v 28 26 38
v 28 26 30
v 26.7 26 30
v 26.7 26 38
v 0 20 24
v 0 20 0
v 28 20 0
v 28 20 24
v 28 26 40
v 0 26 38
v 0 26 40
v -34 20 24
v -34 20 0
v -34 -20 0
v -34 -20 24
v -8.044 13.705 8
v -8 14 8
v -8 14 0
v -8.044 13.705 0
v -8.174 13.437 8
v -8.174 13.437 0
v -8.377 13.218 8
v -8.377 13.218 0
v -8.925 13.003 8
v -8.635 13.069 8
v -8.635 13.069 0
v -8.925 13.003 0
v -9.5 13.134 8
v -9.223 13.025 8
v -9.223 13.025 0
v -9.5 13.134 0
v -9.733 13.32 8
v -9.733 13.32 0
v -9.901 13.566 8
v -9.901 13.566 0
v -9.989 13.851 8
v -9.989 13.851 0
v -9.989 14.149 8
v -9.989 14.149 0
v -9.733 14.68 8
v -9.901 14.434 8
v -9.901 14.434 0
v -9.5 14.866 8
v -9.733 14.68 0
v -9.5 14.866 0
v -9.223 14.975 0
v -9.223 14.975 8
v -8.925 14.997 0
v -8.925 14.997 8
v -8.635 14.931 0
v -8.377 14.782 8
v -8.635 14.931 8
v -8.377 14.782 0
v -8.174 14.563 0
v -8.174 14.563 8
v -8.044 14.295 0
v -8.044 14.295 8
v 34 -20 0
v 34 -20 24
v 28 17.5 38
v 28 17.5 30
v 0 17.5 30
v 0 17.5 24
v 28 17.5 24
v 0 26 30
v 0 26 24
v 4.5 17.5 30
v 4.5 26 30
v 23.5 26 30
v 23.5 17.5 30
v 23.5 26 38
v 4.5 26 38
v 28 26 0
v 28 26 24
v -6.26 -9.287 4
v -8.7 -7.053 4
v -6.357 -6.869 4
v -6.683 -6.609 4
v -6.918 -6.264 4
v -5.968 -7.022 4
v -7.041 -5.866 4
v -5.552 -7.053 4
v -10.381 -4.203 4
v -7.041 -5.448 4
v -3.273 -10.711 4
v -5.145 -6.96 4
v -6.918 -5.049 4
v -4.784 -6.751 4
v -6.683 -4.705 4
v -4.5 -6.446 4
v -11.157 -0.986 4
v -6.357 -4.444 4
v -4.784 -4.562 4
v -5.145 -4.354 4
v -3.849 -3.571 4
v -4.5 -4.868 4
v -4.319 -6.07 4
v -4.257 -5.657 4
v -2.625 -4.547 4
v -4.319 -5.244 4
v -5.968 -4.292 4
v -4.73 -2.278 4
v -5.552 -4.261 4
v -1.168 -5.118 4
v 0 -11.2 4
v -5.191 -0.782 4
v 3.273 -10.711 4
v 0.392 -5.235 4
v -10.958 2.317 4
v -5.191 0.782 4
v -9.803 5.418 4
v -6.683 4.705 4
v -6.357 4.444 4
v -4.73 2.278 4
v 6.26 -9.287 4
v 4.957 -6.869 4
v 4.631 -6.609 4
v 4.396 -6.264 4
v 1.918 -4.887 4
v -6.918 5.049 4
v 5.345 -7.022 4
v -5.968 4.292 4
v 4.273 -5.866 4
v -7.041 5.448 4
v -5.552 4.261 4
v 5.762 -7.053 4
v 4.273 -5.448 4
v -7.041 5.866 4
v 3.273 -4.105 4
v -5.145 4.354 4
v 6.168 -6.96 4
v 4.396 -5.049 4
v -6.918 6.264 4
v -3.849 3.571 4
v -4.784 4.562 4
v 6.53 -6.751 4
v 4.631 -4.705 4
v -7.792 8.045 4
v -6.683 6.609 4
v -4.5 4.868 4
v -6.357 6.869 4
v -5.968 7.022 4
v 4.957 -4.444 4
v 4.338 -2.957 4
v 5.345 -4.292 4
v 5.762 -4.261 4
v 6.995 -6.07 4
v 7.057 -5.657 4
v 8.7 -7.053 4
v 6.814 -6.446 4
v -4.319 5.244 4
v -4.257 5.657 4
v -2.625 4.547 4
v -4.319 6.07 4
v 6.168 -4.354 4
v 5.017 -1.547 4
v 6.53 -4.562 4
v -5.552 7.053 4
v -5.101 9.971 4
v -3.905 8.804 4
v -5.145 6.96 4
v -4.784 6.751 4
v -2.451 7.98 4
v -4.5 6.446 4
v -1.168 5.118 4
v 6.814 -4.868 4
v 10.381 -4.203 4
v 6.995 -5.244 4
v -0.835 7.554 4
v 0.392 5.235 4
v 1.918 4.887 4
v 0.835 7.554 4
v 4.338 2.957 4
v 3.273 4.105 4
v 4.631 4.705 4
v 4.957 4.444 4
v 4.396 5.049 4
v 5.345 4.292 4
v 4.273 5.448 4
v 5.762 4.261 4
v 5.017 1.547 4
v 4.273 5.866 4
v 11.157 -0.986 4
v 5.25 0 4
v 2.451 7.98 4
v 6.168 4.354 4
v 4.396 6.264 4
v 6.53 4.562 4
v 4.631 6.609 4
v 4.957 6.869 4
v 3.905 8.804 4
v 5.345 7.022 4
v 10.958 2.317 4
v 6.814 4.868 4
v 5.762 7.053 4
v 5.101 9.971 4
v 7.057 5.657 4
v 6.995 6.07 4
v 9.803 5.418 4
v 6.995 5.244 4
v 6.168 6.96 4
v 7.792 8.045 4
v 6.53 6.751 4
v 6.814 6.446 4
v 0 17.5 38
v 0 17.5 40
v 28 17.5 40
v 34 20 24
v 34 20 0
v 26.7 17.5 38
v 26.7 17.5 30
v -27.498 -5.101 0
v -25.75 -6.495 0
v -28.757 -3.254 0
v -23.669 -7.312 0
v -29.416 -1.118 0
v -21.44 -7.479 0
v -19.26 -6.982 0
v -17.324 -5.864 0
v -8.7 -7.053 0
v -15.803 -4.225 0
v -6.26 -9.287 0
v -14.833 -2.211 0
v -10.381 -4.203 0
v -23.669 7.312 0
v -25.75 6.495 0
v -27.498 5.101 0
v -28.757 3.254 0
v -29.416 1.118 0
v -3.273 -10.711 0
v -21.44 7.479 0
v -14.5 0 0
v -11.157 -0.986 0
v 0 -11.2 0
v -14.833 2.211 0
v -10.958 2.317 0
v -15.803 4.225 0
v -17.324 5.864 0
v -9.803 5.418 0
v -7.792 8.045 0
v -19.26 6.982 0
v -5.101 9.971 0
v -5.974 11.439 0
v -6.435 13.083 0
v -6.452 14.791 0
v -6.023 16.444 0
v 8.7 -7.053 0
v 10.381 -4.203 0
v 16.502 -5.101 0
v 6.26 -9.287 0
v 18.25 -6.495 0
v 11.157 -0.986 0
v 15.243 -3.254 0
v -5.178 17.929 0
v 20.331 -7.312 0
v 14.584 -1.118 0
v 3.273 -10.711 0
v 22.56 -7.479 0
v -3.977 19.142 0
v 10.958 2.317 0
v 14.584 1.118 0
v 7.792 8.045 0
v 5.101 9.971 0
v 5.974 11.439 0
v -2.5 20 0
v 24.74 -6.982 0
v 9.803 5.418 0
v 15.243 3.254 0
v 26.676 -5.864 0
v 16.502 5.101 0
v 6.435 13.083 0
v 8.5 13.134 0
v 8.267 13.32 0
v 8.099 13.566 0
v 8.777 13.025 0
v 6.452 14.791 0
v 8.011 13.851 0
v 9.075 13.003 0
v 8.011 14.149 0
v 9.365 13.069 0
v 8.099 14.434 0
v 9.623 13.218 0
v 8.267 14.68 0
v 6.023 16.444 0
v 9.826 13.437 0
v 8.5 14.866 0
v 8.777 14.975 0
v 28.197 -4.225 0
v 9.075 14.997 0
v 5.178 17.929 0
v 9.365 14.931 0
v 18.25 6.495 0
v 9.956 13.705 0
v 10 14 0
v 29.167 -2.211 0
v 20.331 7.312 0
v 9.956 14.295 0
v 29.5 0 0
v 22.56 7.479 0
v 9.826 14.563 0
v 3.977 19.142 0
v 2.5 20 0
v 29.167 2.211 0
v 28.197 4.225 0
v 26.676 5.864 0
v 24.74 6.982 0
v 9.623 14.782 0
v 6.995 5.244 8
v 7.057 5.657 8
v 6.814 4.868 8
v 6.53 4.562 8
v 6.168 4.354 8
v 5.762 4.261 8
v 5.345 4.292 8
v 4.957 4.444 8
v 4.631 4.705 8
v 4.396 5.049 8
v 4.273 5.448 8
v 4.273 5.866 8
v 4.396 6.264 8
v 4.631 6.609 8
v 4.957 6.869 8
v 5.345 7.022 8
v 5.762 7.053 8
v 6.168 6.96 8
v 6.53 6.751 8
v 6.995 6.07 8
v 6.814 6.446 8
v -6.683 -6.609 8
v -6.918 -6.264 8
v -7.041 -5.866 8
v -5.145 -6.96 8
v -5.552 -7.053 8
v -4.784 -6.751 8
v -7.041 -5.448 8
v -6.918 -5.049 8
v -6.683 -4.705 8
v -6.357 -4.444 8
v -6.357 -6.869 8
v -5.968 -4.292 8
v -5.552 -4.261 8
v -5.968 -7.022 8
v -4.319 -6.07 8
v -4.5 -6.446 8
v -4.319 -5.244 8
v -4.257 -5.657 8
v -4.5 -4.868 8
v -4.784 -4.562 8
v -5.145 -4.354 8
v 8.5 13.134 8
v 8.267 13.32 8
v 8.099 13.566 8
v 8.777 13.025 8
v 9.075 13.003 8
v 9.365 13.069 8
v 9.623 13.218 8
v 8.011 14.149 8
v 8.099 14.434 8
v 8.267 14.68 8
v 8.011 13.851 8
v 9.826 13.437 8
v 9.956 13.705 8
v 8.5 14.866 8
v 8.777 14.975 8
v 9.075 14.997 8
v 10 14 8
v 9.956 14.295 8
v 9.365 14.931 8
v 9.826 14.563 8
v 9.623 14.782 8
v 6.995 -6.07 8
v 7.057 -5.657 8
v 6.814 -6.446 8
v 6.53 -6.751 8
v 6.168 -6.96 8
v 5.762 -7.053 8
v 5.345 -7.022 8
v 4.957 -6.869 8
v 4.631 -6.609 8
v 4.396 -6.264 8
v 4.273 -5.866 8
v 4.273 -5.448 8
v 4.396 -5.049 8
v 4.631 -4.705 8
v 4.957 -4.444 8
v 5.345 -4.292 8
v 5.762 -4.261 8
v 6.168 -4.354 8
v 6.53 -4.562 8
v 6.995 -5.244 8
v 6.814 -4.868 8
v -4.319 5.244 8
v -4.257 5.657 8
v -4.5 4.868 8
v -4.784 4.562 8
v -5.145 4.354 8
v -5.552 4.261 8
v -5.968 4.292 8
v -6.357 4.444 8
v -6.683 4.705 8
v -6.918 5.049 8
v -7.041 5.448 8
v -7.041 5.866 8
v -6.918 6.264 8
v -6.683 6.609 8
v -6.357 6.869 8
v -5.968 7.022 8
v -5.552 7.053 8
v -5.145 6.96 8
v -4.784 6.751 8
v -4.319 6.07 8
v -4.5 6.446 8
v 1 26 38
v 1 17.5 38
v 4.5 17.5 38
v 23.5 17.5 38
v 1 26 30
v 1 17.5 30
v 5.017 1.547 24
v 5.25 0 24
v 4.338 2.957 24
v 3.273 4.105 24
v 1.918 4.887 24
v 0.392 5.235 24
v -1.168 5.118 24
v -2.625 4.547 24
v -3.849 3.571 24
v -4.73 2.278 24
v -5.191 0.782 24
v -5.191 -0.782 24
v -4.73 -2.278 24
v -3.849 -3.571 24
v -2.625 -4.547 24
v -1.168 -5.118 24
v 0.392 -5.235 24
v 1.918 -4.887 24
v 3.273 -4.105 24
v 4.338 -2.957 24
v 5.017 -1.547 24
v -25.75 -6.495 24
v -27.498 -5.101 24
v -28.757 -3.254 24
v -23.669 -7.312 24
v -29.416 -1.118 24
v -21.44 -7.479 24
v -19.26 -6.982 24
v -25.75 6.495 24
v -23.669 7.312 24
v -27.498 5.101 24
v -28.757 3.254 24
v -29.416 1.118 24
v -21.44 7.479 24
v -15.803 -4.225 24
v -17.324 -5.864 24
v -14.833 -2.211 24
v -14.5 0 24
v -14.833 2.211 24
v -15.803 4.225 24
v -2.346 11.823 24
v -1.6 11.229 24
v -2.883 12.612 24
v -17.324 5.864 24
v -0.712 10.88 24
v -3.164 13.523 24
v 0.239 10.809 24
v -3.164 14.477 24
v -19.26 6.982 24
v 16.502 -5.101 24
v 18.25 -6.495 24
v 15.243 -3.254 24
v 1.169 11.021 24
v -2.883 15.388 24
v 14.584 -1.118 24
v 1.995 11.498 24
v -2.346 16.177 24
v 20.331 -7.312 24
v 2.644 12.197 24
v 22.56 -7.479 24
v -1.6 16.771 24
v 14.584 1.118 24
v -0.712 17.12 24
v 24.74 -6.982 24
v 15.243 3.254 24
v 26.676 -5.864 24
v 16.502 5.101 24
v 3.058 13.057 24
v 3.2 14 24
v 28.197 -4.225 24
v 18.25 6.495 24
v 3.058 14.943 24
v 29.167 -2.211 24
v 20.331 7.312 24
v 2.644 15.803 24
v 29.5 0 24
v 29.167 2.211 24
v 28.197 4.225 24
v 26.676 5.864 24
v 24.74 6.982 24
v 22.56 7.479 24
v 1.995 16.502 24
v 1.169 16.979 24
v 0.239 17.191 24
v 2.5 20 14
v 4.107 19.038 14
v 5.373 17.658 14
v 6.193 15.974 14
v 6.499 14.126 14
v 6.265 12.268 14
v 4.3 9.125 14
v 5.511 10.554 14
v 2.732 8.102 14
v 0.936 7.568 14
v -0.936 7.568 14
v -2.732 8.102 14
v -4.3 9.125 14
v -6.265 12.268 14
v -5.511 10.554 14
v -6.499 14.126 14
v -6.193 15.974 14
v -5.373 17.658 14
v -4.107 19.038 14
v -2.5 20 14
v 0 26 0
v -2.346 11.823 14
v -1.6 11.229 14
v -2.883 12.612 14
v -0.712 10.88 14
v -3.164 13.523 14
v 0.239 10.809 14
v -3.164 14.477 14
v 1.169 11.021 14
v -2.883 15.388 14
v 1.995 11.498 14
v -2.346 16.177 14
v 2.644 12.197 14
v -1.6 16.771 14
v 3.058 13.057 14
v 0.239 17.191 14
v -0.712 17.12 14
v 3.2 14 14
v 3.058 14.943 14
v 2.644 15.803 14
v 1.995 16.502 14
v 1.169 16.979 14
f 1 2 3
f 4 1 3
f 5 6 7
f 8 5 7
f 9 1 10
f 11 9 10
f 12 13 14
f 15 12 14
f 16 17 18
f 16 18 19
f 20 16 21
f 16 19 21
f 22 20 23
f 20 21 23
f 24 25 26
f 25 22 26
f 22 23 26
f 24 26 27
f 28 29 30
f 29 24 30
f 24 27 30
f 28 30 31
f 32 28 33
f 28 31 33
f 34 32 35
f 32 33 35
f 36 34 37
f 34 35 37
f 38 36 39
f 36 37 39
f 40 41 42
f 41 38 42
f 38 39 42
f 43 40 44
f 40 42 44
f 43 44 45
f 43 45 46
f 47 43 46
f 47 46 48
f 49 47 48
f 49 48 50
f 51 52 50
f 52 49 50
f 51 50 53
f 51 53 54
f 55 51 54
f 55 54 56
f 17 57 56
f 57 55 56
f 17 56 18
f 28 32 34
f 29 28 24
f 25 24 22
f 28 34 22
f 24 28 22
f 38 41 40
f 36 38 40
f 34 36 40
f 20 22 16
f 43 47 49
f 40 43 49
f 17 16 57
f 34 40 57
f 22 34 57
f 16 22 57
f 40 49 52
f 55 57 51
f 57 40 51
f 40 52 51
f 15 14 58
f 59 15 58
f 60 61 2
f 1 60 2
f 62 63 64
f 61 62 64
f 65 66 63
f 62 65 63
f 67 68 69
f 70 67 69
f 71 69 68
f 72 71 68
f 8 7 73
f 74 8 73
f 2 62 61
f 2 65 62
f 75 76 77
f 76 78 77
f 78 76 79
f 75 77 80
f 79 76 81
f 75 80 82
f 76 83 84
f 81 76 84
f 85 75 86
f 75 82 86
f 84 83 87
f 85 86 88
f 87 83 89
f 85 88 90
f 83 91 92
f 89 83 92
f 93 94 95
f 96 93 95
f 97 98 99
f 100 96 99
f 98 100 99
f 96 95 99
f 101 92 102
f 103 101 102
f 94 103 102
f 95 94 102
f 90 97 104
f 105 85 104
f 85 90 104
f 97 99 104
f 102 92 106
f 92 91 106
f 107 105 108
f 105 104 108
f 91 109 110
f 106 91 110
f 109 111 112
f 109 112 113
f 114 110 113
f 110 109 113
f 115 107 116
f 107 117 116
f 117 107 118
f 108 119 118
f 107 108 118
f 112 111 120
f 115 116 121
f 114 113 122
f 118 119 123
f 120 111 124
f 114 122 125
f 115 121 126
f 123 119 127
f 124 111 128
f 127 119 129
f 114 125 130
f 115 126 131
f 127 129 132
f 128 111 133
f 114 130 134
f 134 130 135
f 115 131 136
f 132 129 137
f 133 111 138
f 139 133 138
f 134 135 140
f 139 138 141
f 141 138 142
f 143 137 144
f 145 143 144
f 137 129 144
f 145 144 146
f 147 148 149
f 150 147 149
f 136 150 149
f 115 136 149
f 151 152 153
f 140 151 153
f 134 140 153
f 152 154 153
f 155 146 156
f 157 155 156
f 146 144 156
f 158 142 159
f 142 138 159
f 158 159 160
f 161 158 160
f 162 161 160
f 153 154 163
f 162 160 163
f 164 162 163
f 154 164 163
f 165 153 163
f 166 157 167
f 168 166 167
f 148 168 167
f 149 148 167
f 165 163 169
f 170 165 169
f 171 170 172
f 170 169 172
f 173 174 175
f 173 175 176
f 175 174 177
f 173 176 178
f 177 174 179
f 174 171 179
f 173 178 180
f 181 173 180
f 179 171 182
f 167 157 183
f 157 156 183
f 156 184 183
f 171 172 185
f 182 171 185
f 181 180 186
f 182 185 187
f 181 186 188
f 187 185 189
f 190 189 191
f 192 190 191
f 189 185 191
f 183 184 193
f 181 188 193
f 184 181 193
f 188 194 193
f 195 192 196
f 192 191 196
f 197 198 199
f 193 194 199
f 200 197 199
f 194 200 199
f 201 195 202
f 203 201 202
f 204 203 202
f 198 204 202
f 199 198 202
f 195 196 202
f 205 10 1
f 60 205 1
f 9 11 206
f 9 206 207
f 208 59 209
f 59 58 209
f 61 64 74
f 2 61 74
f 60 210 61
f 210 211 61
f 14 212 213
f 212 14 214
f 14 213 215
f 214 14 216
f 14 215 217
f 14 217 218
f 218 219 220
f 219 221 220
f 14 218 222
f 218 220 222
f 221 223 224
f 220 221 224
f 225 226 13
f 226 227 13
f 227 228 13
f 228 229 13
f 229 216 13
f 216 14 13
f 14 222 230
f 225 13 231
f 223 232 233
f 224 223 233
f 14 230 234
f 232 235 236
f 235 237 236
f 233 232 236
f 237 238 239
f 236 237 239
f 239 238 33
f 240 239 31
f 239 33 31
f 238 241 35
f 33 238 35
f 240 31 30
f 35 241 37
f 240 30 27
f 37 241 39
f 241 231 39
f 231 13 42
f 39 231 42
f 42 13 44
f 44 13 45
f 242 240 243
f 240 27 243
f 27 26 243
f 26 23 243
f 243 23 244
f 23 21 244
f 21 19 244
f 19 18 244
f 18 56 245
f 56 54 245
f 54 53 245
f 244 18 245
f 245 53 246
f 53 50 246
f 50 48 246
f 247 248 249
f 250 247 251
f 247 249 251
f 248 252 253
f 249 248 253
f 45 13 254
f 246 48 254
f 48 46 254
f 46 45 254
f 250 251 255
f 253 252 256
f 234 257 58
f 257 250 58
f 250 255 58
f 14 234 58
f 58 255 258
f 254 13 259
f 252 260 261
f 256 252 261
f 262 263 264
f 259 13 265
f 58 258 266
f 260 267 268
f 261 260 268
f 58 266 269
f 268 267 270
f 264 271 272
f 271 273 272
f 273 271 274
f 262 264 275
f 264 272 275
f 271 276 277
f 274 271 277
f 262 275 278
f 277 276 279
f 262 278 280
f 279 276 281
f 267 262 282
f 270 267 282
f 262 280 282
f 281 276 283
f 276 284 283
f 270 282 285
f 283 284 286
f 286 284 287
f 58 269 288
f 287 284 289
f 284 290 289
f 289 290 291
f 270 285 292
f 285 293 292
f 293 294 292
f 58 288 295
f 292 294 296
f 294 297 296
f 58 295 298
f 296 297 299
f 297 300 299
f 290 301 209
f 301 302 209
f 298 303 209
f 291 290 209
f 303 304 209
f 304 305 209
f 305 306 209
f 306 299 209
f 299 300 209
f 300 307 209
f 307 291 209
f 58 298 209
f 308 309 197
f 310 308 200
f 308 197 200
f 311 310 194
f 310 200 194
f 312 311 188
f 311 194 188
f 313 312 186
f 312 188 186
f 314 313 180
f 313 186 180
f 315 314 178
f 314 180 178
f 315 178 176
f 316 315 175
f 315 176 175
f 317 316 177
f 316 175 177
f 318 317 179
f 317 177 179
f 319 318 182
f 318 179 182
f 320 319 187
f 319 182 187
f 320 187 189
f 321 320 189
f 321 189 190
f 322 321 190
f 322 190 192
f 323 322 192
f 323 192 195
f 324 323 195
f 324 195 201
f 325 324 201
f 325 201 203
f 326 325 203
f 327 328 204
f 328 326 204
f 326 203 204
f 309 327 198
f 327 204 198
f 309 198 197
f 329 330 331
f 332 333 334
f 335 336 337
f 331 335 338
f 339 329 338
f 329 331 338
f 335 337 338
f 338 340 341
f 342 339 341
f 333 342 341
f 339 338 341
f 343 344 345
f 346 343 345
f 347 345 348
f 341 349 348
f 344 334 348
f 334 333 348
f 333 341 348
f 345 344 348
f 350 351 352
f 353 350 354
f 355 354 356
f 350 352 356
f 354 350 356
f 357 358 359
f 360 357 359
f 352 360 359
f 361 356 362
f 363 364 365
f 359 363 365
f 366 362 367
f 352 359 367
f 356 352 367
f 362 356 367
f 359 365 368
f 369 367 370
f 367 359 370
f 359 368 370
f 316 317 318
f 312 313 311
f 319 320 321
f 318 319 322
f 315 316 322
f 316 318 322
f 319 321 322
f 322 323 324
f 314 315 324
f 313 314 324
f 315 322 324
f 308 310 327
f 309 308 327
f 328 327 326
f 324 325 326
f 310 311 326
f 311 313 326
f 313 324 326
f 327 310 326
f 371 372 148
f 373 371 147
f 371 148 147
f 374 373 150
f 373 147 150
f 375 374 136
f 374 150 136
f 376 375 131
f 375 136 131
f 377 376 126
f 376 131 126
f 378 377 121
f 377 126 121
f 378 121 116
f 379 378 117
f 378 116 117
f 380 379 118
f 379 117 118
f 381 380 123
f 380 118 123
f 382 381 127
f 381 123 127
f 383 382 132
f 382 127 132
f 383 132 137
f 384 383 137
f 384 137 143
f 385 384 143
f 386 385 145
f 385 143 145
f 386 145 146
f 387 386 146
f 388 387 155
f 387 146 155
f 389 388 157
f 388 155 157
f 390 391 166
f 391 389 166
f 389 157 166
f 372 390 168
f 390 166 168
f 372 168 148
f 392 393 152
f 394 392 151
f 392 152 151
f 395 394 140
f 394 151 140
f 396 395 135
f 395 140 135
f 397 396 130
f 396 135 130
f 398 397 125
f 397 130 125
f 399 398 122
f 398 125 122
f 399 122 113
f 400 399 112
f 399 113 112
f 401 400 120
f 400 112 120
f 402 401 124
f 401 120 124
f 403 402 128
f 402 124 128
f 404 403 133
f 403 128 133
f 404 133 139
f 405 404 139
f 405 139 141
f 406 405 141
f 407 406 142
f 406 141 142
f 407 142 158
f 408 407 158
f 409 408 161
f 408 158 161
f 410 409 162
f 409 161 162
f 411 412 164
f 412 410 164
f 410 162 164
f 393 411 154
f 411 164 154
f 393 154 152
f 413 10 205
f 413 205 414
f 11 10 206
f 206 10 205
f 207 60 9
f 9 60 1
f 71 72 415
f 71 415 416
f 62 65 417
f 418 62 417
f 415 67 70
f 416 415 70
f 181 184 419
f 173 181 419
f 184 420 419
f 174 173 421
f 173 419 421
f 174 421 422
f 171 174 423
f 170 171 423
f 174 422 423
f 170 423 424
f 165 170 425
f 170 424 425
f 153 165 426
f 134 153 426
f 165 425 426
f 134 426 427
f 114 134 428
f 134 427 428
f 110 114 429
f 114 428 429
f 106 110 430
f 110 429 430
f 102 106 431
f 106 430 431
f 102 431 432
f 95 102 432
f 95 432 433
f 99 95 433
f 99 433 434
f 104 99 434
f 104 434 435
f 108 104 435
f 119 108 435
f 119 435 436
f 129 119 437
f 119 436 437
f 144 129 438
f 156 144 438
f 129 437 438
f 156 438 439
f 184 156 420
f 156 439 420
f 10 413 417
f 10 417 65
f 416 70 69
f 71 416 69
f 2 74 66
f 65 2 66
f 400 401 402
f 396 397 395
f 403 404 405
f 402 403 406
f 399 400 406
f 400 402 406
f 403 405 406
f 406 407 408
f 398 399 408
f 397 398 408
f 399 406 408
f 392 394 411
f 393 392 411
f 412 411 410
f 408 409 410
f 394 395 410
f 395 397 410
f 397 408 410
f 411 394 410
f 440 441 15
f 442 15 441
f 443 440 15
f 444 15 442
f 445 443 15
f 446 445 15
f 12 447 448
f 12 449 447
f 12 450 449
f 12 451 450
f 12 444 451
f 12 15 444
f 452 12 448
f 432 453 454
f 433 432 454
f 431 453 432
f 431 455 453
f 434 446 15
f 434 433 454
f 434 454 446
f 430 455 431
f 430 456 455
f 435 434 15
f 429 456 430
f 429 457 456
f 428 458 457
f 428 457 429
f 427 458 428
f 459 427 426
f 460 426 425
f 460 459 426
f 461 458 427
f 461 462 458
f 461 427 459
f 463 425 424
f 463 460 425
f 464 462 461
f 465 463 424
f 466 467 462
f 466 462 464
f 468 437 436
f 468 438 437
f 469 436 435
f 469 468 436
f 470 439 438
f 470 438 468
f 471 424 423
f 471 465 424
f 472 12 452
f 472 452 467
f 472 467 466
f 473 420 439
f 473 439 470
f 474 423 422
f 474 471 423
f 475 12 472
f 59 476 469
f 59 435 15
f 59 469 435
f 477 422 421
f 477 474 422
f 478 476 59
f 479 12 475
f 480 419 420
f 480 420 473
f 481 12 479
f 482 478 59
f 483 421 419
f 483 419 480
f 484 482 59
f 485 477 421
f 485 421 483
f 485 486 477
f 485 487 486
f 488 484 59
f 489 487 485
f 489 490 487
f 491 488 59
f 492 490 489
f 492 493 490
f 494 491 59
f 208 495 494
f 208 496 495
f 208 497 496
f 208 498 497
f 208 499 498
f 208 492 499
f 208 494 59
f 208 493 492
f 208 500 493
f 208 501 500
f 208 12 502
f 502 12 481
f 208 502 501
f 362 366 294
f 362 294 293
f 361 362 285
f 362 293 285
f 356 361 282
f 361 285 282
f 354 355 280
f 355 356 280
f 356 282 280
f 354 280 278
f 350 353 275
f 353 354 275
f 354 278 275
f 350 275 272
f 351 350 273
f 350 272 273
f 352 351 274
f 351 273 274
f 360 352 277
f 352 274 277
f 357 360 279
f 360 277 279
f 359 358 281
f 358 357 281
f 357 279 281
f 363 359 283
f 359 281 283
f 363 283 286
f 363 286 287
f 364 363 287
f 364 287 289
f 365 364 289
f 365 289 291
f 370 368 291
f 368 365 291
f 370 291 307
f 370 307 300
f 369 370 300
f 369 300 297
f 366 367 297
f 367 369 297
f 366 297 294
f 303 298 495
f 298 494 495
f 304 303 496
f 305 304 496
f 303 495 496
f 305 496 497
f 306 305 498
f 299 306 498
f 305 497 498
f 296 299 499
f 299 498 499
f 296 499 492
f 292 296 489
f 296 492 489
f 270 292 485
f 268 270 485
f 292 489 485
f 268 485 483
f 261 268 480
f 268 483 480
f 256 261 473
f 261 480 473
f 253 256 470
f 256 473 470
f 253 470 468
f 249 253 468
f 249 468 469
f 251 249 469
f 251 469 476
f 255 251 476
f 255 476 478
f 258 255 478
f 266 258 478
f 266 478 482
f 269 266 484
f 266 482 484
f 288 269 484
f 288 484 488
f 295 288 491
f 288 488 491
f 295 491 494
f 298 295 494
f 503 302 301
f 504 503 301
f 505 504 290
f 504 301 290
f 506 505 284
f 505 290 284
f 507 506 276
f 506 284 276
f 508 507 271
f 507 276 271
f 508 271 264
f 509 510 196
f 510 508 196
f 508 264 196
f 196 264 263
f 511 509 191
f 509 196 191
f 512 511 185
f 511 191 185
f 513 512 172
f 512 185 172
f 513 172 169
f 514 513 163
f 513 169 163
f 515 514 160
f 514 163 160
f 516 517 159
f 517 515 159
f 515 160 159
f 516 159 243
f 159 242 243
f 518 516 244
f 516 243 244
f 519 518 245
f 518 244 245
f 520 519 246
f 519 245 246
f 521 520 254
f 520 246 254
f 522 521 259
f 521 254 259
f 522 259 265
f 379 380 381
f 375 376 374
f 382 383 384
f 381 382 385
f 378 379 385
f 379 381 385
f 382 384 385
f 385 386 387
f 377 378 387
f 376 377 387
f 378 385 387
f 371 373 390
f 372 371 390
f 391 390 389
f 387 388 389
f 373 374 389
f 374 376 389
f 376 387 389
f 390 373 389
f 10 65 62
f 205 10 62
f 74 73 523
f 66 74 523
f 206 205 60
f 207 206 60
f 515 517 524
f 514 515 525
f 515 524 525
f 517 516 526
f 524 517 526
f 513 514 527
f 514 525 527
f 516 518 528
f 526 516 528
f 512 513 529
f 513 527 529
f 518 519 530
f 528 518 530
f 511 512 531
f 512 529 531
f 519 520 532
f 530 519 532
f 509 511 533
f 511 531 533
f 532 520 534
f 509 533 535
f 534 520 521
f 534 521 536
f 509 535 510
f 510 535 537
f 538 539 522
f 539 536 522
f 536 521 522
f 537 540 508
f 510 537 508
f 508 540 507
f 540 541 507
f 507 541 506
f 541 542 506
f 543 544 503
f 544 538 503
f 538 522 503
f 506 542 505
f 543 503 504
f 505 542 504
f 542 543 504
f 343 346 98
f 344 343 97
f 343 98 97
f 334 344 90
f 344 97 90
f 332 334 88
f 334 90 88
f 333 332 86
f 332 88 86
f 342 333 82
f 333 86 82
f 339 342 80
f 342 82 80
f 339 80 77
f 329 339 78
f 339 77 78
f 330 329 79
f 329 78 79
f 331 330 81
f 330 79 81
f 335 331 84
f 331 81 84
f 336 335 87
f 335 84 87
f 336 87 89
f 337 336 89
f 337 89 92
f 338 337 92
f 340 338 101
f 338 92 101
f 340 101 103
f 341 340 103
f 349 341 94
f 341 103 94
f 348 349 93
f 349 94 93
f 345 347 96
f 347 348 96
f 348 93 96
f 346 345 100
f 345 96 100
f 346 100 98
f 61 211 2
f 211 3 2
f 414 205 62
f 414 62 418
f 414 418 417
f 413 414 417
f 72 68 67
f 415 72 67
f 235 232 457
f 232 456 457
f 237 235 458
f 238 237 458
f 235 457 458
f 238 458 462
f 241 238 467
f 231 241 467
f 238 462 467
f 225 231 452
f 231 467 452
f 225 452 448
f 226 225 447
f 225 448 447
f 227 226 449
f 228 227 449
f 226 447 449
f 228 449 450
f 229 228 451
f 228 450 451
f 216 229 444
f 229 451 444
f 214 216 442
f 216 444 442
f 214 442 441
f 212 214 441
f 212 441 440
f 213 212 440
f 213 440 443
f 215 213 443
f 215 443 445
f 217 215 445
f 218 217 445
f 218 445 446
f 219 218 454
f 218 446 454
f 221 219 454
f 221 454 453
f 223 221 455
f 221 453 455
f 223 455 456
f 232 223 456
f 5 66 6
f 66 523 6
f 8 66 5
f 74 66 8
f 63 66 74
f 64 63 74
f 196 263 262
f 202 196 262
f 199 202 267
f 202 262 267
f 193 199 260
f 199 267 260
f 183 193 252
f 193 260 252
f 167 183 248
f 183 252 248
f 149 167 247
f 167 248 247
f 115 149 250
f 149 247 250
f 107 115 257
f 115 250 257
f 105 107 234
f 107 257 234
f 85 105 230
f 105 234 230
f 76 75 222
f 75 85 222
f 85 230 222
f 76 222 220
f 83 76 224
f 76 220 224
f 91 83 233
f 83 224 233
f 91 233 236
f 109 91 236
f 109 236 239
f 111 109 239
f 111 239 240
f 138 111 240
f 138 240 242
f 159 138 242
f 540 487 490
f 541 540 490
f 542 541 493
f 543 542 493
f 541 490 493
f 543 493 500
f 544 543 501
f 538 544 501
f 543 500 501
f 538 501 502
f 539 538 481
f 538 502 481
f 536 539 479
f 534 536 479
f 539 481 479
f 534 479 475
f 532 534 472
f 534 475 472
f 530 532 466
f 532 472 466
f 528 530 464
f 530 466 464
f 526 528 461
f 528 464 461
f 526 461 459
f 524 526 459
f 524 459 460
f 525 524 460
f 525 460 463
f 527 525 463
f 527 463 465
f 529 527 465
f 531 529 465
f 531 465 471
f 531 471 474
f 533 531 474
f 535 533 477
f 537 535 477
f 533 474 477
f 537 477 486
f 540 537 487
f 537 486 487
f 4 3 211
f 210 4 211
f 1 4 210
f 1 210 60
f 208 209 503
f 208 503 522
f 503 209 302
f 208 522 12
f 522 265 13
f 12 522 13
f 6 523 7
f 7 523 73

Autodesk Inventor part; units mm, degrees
sketch "Skizze1" plane through (0, 0, 0) normal (0, 0, 1) x (1, 0, 0)
  line L0 (-34, -20) -> (34, -20)
  line L1 (34, -20) -> (34, 20)
  line L2 (34, 20) -> (-34, 20)
  line L3 (-34, 20) -> (-34, -20)
extrude "Extrusion1" add sketch "Skizze1" along normal blind 24
sketch "Skizze2" plane through (0, 0, 0) normal (0, 0, 1) x (1, 0, 0)
  line L0 (0, 20) -> (28, 20)
  line L1 (28, 20) -> (28, 26)
  line L2 (28, 26) -> (0, 26)
  line L3 (0, 26) -> (0, 20)
extrude "Extrusion2" add sketch "Skizze2" along normal blind 24 separate body
ref_plane "Arbeitsebene1" through (0, 0, 24) normal (0, 0, 1) x (1, 0, 0)
sketch "Skizze3" plane through (0, 0, 24) normal (0, 0, 1) x (1, 0, 0)
  line L0 (0, 17.5) -> (28, 17.5)
  line L1 (28, 17.5) -> (28, 26)
  line L2 (28, 26) -> (0, 26)
  line L3 (0, 26) -> (0, 17.5)
extrude "Extrusion3" add sketch "Skizze3" along normal blind 6 separate body
ref_plane "Arbeitsebene2" through (0, 0, 30) normal (0, 0, 1) x (1, 0, 0)
sketch "Skizze4" plane through (0, 0, 30) normal (0, 0, 1) x (1, 0, 0)
  line L0 (0, 17.5) -> (1, 17.5)
  line L1 (1, 17.5) -> (1, 26)
  line L2 (1, 26) -> (0, 26)
  line L3 (0, 26) -> (0, 17.5)
extrude "Extrusion4" add sketch "Skizze4" along normal blind 8 separate body
sketch "Skizze5" plane through (0, 0, 30) normal (0, 0, 1) x (1, 0, 0)
  line L0 (4.5, 17.5) -> (23.5, 17.5)
  line L1 (23.5, 17.5) -> (23.5, 26)
  line L2 (23.5, 26) -> (4.5, 26)
  line L3 (4.5, 26) -> (4.5, 17.5)
extrude "Extrusion5" add sketch "Skizze5" along normal blind 8 separate body
sketch "Skizze6" plane through (0, 0, 30) normal (0, 0, 1) x (1, 0, 0)
  line L0 (26.7, 17.5) -> (28, 17.5)
  line L1 (28, 17.5) -> (28, 26)
  line L2 (28, 26) -> (26.7, 26)
  line L3 (26.7, 26) -> (26.7, 17.5)
extrude "Extrusion6" add sketch "Skizze6" along normal blind 8 separate body
ref_plane "Arbeitsebene3" through (0, 0, 38) normal (0, 0, 1) x (1, 0, 0)
sketch "Skizze7" plane through (0, 0, 38) normal (0, 0, 1) x (1, 0, 0)
  line L0 (0, 17.5) -> (28, 17.5)
  line L1 (28, 17.5) -> (28, 26)
  line L2 (28, 26) -> (0, 26)
  line L3 (0, 26) -> (0, 17.5)
extrude "Extrusion7" add sketch "Skizze7" along normal blind 2 separate body
sketch "Skizze8" plane through (0, 0, 24) normal (0, 0, 1) x (1, 0, 0)
  circle A0 centre (-22, 0) radius 7.5
extrude "Extrusion8" cut sketch "Skizze8" against normal blind 24.2 bodies 1
sketch "Skizze9" plane through (0, 0, 24) normal (0, 0, 1) x (1, 0, 0)
  circle A0 centre (22, 0) radius 7.5
extrude "Extrusion9" cut sketch "Skizze9" against normal blind 24.2 bodies 1
sketch "Skizze10" plane through (0, 0, 24) normal (0, 0, 1) x (1, 0, 0)
  circle A0 centre (0, 0) radius 5.25
extrude "Extrusion10" cut sketch "Skizze10" against normal blind 24.2 bodies 1
sketch "Skizze11" plane through (0, 0, 24) normal (0, 0, 1) x (1, 0, 0)
  circle A0 centre (0, 14) radius 3.2
extrude "Extrusion11" cut sketch "Skizze11" against normal blind 24.2 bodies 1
sketch "Skizze12" plane through (0, 0, 0) normal (0, 0, 1) x (1, 0, 0)
  circle A0 centre (0, 0) radius 11.2
extrude "Extrusion12" cut sketch "Skizze12" along normal blind 4 bodies 1
sketch "Skizze13" plane through (0, 0, 0) normal (0, 0, 1) x (1, 0, 0)
  circle A0 centre (5.6569, 5.6569) radius 1.4
extrude "Extrusion13" cut sketch "Skizze13" along normal blind 8 bodies 1
sketch "Skizze14" plane through (0, 0, 0) normal (0, 0, 1) x (1, 0, 0)
  circle A0 centre (-5.6569, 5.6569) radius 1.4
extrude "Extrusion14" cut sketch "Skizze14" along normal blind 8 bodies 1
sketch "Skizze15" plane through (0, 0, 0) normal (0, 0, 1) x (1, 0, 0)
  circle A0 centre (-5.6569, -5.6569) radius 1.4
extrude "Extrusion15" cut sketch "Skizze15" along normal blind 8 bodies 1
sketch "Skizze16" plane through (0, 0, 0) normal (0, 0, 1) x (1, 0, 0)
  circle A0 centre (5.6569, -5.6569) radius 1.4
extrude "Extrusion16" cut sketch "Skizze16" along normal blind 8 bodies 1
sketch "Skizze17" plane through (0, 0, 0) normal (0, 0, 1) x (1, 0, 0)
  circle A0 centre (0, 14) radius 6.5
extrude "Extrusion17" cut sketch "Skizze17" along normal blind 14 bodies 1
sketch "Skizze18" plane through (0, 0, 0) normal (0, 0, 1) x (1, 0, 0)
  circle A0 centre (-9, 14) radius 1
extrude "Extrusion18" cut sketch "Skizze18" along normal blind 8 bodies 1
sketch "Skizze19" plane through (0, 0, 0) normal (0, 0, 1) x (1, 0, 0)
  circle A0 centre (9, 14) radius 1
extrude "Extrusion19" cut sketch "Skizze19" along normal blind 8 bodies 1
properties part number "Taster_Schlitten"
